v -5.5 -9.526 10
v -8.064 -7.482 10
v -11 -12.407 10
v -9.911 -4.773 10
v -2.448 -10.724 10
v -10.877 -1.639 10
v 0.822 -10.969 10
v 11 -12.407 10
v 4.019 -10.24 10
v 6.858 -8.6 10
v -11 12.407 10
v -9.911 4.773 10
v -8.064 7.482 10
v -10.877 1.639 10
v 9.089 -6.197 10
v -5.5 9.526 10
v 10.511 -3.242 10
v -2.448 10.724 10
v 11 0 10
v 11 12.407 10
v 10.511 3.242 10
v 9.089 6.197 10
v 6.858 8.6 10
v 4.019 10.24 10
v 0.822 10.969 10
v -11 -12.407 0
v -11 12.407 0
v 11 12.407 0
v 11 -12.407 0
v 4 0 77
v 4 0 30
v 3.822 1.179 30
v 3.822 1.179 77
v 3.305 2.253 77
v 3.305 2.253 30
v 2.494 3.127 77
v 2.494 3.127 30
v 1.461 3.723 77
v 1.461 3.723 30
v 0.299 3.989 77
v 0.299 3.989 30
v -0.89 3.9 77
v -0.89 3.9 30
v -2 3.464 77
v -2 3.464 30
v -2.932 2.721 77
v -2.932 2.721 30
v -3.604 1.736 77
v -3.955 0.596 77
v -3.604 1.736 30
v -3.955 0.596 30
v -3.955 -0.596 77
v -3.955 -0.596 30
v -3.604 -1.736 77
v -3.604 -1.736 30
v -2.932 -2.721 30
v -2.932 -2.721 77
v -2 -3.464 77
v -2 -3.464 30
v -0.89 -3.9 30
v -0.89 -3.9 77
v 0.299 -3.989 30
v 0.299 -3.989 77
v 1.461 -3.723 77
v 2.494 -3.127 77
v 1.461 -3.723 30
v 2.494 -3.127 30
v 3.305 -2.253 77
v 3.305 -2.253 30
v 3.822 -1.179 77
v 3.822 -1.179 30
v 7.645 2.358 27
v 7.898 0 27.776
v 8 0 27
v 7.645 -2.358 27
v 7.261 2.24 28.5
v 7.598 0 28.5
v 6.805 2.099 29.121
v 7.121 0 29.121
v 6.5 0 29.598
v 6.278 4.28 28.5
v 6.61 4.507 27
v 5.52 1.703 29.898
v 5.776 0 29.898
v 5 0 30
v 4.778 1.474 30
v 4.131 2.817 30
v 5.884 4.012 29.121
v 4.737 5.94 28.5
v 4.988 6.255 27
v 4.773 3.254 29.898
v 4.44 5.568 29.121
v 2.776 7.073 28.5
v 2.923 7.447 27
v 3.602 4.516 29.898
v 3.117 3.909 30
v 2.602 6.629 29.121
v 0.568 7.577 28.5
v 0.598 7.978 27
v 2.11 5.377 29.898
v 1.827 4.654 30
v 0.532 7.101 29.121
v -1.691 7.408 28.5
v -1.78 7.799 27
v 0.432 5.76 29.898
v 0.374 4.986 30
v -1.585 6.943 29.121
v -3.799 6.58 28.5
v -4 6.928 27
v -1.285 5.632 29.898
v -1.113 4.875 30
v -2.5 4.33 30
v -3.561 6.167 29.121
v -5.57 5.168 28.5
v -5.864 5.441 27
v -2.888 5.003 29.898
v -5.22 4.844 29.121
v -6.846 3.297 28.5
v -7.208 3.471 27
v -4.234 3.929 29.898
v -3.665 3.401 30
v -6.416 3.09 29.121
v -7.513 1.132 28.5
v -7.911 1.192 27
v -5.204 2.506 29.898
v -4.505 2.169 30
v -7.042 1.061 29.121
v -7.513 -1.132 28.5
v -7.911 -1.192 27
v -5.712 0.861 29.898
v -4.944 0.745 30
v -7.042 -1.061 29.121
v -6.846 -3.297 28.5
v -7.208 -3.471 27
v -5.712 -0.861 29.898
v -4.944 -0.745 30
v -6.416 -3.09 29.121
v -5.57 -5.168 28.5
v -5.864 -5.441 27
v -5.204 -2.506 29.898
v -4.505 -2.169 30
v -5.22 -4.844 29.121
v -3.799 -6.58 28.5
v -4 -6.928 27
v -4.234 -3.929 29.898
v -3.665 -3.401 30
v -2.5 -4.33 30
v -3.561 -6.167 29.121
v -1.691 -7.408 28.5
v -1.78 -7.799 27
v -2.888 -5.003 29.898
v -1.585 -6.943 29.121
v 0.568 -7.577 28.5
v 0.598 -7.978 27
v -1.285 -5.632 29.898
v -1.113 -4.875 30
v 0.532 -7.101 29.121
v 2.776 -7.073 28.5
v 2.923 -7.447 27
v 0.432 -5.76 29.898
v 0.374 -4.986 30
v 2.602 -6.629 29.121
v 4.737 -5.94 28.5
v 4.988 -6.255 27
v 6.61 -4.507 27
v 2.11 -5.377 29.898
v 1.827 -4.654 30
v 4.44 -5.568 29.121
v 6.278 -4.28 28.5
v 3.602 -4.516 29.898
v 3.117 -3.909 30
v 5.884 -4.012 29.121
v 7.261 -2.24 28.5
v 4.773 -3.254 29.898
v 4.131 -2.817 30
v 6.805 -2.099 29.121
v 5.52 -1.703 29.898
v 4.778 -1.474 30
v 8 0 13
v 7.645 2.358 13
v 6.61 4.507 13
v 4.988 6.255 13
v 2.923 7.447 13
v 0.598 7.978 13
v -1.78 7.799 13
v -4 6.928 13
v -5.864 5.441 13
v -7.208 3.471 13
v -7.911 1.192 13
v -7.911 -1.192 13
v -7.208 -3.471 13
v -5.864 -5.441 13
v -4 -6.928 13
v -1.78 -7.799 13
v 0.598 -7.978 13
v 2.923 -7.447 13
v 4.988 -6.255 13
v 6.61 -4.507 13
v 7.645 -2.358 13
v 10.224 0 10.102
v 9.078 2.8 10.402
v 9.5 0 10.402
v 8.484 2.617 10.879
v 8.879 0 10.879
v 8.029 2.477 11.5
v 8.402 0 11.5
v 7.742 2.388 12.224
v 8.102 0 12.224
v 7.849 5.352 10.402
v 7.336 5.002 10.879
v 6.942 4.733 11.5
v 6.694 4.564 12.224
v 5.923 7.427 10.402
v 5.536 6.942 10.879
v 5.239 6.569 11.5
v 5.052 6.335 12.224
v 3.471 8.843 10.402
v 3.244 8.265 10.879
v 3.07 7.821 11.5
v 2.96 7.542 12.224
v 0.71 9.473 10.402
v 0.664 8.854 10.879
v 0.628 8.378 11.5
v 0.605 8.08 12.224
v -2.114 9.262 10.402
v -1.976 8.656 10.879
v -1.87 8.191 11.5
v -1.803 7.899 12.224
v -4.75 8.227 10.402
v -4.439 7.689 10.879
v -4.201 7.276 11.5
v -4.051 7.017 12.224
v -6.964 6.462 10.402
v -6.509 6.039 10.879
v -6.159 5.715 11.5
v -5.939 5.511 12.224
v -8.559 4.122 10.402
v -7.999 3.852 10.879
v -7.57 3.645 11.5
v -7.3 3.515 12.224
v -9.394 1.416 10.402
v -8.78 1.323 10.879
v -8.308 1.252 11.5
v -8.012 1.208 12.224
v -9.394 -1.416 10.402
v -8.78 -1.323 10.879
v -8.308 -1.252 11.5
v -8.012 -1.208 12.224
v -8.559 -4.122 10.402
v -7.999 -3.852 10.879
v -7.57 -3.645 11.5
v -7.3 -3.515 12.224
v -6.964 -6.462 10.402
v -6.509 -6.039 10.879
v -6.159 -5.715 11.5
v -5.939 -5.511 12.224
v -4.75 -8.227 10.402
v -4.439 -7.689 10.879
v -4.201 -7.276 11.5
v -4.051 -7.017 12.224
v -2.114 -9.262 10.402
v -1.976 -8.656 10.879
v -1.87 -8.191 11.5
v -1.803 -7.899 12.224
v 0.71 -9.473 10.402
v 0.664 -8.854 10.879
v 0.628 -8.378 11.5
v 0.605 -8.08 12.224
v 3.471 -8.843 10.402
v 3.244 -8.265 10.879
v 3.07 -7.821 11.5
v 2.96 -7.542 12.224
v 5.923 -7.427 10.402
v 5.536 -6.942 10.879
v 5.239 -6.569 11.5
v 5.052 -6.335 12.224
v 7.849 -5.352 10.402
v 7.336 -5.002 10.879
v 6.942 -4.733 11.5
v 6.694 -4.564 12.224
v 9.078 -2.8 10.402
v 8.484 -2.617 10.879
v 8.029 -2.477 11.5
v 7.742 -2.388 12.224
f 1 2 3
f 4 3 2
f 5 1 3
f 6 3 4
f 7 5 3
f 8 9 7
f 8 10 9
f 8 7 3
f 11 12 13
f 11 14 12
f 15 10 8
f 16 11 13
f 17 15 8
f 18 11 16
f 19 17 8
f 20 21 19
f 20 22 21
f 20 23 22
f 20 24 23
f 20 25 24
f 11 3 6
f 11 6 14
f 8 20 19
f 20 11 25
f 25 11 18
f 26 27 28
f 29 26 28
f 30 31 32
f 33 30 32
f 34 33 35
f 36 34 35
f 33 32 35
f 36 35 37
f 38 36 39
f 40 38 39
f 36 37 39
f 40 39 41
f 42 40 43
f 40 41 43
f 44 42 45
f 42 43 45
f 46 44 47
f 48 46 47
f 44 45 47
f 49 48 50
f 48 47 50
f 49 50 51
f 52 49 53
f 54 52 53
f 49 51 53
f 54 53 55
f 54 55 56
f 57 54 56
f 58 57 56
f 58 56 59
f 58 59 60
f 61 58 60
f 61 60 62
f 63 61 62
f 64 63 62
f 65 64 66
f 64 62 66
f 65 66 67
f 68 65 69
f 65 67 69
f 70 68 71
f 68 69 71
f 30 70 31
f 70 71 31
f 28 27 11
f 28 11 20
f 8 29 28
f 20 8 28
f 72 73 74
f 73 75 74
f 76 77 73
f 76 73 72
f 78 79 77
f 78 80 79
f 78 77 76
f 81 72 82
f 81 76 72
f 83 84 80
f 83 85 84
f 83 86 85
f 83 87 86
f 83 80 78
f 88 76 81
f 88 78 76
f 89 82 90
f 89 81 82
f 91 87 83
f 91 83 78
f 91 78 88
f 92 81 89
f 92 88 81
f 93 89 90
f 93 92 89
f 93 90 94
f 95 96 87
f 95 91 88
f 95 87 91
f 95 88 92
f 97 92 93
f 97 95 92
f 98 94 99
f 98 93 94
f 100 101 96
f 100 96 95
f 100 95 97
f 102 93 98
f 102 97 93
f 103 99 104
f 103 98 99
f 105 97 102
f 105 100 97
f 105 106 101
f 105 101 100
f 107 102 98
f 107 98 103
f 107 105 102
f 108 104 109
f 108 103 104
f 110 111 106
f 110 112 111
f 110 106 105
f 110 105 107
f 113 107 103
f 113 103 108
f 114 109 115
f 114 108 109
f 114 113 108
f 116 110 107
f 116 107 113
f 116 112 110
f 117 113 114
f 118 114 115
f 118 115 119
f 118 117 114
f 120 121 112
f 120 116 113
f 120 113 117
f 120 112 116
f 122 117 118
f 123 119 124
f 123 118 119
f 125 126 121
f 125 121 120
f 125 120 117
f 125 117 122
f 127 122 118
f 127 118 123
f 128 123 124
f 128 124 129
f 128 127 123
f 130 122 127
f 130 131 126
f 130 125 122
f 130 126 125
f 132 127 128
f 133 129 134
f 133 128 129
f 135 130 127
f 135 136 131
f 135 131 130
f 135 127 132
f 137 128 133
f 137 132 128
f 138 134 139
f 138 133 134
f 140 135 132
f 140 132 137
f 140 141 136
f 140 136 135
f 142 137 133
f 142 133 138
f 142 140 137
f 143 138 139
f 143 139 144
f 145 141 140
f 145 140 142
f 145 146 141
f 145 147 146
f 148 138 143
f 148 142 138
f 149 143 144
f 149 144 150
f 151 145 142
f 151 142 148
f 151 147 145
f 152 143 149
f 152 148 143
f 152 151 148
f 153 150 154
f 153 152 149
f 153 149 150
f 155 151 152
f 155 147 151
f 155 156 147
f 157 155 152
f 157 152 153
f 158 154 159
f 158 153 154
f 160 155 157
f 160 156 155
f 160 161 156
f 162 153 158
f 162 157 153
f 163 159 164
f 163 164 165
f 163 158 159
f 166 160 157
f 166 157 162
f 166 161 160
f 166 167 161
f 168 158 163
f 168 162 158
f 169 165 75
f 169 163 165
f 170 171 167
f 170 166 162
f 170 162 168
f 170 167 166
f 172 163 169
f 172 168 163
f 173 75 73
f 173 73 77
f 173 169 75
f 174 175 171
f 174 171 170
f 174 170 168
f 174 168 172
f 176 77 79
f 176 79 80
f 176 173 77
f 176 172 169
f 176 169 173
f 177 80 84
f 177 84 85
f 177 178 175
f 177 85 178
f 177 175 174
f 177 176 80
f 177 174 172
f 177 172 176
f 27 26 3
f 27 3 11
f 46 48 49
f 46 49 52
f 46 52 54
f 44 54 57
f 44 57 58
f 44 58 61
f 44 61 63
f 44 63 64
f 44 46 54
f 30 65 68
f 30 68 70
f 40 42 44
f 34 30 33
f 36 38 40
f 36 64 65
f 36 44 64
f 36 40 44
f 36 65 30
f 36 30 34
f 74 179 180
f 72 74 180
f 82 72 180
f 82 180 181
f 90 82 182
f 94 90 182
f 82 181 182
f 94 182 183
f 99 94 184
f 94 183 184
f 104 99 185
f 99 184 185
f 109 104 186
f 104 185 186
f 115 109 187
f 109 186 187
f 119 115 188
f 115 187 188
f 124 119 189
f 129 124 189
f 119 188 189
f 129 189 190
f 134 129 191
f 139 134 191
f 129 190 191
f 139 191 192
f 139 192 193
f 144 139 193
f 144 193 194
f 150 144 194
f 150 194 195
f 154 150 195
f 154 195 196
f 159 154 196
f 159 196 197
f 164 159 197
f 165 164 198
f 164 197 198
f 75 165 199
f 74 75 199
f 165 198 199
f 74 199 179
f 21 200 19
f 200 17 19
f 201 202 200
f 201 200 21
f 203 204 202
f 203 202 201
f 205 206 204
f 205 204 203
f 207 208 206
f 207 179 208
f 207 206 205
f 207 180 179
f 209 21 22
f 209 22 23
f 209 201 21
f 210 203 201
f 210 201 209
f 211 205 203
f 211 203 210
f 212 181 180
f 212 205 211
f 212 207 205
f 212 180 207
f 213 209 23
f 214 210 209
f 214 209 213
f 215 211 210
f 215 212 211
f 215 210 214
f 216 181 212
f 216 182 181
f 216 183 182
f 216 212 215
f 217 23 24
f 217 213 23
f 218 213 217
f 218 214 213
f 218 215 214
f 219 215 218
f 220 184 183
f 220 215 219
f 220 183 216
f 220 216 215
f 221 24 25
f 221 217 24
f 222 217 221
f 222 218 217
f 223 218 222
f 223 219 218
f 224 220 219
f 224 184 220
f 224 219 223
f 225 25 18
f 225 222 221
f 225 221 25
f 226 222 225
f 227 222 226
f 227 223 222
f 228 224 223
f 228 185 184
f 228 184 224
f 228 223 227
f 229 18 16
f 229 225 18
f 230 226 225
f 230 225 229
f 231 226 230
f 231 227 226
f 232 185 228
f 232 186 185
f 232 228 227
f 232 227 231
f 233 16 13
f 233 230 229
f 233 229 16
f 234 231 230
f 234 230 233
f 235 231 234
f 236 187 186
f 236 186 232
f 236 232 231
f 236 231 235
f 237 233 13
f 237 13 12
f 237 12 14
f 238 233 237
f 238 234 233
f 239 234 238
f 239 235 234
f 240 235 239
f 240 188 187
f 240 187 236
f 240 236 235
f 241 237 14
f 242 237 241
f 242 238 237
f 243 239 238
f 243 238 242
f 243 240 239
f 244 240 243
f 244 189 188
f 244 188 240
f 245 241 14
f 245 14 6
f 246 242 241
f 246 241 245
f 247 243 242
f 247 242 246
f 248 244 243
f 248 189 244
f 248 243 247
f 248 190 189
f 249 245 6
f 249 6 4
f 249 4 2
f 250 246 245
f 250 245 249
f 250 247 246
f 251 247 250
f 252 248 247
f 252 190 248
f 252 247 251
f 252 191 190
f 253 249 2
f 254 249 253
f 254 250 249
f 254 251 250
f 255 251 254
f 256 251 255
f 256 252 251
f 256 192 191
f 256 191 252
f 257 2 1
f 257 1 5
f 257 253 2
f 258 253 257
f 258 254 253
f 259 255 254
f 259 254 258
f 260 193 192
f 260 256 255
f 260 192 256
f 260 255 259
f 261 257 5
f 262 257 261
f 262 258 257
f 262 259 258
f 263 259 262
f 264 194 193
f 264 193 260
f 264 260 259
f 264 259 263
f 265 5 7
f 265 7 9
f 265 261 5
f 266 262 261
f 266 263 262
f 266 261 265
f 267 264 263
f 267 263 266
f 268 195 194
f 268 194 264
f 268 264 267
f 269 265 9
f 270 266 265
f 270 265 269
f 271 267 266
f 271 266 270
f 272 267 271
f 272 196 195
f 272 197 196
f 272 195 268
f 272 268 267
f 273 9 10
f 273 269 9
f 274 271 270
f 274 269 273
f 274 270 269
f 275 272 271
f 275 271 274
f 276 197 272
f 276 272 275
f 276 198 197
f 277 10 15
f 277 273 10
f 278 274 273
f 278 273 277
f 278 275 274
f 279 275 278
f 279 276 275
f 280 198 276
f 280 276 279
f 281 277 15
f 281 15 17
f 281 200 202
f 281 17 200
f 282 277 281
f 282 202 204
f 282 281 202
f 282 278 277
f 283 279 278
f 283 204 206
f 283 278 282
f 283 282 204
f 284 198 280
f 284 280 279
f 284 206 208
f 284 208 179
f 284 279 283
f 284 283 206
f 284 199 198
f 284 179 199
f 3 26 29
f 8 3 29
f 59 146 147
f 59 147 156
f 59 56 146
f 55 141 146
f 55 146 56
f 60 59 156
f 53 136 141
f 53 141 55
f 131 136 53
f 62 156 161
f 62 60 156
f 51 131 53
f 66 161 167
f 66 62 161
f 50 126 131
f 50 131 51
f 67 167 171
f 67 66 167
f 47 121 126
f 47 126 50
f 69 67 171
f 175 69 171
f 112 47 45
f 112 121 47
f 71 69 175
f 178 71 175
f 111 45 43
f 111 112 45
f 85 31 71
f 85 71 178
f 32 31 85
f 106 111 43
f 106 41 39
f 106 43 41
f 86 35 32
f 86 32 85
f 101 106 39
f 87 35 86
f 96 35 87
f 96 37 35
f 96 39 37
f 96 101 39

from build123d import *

# Parameters (mm, degrees)
F0_W     = 22
F0_H     = 24.8139590786
F1_DEPTH = 10
F2_R     = 8
F3_DEPTH = 20
F4_R     = 4
F5_DEPTH = 47
F6_R     = 2.99999


# Not quite as in the source:
# - a fillet or chamfer is up to 0.001 mm smaller than in the source, because OpenCascade refuses the exact size


with BuildPart() as f1:
    # F0 (on Top) → F1 (new body)
    with BuildSketch(Plane.XY):
        Rectangle(F0_W, F0_H)
    extrude(amount=F1_DEPTH)

    # F2 (on face) → F3 (join)
    with BuildSketch(Plane.XY.offset(10)):
        Circle(F2_R)
    extrude(amount=F3_DEPTH)

    # F4 (on face) → F5 (join)
    with BuildSketch(Plane.XY.offset(30)):
        Circle(F4_R)
    extrude(amount=F5_DEPTH)

    # F6 (radius 3 in the source; OpenCascade refuses exactly that, so slightly less here)
    f6_edges = [f1.edges().sort_by_distance(p)[0] for p in [
        (8, 0, 20),
        (-8, 0, 10),
        (-8, 0, 30),
    ]]
    fillet(f6_edges, radius=F6_R)


solid = f1.part
